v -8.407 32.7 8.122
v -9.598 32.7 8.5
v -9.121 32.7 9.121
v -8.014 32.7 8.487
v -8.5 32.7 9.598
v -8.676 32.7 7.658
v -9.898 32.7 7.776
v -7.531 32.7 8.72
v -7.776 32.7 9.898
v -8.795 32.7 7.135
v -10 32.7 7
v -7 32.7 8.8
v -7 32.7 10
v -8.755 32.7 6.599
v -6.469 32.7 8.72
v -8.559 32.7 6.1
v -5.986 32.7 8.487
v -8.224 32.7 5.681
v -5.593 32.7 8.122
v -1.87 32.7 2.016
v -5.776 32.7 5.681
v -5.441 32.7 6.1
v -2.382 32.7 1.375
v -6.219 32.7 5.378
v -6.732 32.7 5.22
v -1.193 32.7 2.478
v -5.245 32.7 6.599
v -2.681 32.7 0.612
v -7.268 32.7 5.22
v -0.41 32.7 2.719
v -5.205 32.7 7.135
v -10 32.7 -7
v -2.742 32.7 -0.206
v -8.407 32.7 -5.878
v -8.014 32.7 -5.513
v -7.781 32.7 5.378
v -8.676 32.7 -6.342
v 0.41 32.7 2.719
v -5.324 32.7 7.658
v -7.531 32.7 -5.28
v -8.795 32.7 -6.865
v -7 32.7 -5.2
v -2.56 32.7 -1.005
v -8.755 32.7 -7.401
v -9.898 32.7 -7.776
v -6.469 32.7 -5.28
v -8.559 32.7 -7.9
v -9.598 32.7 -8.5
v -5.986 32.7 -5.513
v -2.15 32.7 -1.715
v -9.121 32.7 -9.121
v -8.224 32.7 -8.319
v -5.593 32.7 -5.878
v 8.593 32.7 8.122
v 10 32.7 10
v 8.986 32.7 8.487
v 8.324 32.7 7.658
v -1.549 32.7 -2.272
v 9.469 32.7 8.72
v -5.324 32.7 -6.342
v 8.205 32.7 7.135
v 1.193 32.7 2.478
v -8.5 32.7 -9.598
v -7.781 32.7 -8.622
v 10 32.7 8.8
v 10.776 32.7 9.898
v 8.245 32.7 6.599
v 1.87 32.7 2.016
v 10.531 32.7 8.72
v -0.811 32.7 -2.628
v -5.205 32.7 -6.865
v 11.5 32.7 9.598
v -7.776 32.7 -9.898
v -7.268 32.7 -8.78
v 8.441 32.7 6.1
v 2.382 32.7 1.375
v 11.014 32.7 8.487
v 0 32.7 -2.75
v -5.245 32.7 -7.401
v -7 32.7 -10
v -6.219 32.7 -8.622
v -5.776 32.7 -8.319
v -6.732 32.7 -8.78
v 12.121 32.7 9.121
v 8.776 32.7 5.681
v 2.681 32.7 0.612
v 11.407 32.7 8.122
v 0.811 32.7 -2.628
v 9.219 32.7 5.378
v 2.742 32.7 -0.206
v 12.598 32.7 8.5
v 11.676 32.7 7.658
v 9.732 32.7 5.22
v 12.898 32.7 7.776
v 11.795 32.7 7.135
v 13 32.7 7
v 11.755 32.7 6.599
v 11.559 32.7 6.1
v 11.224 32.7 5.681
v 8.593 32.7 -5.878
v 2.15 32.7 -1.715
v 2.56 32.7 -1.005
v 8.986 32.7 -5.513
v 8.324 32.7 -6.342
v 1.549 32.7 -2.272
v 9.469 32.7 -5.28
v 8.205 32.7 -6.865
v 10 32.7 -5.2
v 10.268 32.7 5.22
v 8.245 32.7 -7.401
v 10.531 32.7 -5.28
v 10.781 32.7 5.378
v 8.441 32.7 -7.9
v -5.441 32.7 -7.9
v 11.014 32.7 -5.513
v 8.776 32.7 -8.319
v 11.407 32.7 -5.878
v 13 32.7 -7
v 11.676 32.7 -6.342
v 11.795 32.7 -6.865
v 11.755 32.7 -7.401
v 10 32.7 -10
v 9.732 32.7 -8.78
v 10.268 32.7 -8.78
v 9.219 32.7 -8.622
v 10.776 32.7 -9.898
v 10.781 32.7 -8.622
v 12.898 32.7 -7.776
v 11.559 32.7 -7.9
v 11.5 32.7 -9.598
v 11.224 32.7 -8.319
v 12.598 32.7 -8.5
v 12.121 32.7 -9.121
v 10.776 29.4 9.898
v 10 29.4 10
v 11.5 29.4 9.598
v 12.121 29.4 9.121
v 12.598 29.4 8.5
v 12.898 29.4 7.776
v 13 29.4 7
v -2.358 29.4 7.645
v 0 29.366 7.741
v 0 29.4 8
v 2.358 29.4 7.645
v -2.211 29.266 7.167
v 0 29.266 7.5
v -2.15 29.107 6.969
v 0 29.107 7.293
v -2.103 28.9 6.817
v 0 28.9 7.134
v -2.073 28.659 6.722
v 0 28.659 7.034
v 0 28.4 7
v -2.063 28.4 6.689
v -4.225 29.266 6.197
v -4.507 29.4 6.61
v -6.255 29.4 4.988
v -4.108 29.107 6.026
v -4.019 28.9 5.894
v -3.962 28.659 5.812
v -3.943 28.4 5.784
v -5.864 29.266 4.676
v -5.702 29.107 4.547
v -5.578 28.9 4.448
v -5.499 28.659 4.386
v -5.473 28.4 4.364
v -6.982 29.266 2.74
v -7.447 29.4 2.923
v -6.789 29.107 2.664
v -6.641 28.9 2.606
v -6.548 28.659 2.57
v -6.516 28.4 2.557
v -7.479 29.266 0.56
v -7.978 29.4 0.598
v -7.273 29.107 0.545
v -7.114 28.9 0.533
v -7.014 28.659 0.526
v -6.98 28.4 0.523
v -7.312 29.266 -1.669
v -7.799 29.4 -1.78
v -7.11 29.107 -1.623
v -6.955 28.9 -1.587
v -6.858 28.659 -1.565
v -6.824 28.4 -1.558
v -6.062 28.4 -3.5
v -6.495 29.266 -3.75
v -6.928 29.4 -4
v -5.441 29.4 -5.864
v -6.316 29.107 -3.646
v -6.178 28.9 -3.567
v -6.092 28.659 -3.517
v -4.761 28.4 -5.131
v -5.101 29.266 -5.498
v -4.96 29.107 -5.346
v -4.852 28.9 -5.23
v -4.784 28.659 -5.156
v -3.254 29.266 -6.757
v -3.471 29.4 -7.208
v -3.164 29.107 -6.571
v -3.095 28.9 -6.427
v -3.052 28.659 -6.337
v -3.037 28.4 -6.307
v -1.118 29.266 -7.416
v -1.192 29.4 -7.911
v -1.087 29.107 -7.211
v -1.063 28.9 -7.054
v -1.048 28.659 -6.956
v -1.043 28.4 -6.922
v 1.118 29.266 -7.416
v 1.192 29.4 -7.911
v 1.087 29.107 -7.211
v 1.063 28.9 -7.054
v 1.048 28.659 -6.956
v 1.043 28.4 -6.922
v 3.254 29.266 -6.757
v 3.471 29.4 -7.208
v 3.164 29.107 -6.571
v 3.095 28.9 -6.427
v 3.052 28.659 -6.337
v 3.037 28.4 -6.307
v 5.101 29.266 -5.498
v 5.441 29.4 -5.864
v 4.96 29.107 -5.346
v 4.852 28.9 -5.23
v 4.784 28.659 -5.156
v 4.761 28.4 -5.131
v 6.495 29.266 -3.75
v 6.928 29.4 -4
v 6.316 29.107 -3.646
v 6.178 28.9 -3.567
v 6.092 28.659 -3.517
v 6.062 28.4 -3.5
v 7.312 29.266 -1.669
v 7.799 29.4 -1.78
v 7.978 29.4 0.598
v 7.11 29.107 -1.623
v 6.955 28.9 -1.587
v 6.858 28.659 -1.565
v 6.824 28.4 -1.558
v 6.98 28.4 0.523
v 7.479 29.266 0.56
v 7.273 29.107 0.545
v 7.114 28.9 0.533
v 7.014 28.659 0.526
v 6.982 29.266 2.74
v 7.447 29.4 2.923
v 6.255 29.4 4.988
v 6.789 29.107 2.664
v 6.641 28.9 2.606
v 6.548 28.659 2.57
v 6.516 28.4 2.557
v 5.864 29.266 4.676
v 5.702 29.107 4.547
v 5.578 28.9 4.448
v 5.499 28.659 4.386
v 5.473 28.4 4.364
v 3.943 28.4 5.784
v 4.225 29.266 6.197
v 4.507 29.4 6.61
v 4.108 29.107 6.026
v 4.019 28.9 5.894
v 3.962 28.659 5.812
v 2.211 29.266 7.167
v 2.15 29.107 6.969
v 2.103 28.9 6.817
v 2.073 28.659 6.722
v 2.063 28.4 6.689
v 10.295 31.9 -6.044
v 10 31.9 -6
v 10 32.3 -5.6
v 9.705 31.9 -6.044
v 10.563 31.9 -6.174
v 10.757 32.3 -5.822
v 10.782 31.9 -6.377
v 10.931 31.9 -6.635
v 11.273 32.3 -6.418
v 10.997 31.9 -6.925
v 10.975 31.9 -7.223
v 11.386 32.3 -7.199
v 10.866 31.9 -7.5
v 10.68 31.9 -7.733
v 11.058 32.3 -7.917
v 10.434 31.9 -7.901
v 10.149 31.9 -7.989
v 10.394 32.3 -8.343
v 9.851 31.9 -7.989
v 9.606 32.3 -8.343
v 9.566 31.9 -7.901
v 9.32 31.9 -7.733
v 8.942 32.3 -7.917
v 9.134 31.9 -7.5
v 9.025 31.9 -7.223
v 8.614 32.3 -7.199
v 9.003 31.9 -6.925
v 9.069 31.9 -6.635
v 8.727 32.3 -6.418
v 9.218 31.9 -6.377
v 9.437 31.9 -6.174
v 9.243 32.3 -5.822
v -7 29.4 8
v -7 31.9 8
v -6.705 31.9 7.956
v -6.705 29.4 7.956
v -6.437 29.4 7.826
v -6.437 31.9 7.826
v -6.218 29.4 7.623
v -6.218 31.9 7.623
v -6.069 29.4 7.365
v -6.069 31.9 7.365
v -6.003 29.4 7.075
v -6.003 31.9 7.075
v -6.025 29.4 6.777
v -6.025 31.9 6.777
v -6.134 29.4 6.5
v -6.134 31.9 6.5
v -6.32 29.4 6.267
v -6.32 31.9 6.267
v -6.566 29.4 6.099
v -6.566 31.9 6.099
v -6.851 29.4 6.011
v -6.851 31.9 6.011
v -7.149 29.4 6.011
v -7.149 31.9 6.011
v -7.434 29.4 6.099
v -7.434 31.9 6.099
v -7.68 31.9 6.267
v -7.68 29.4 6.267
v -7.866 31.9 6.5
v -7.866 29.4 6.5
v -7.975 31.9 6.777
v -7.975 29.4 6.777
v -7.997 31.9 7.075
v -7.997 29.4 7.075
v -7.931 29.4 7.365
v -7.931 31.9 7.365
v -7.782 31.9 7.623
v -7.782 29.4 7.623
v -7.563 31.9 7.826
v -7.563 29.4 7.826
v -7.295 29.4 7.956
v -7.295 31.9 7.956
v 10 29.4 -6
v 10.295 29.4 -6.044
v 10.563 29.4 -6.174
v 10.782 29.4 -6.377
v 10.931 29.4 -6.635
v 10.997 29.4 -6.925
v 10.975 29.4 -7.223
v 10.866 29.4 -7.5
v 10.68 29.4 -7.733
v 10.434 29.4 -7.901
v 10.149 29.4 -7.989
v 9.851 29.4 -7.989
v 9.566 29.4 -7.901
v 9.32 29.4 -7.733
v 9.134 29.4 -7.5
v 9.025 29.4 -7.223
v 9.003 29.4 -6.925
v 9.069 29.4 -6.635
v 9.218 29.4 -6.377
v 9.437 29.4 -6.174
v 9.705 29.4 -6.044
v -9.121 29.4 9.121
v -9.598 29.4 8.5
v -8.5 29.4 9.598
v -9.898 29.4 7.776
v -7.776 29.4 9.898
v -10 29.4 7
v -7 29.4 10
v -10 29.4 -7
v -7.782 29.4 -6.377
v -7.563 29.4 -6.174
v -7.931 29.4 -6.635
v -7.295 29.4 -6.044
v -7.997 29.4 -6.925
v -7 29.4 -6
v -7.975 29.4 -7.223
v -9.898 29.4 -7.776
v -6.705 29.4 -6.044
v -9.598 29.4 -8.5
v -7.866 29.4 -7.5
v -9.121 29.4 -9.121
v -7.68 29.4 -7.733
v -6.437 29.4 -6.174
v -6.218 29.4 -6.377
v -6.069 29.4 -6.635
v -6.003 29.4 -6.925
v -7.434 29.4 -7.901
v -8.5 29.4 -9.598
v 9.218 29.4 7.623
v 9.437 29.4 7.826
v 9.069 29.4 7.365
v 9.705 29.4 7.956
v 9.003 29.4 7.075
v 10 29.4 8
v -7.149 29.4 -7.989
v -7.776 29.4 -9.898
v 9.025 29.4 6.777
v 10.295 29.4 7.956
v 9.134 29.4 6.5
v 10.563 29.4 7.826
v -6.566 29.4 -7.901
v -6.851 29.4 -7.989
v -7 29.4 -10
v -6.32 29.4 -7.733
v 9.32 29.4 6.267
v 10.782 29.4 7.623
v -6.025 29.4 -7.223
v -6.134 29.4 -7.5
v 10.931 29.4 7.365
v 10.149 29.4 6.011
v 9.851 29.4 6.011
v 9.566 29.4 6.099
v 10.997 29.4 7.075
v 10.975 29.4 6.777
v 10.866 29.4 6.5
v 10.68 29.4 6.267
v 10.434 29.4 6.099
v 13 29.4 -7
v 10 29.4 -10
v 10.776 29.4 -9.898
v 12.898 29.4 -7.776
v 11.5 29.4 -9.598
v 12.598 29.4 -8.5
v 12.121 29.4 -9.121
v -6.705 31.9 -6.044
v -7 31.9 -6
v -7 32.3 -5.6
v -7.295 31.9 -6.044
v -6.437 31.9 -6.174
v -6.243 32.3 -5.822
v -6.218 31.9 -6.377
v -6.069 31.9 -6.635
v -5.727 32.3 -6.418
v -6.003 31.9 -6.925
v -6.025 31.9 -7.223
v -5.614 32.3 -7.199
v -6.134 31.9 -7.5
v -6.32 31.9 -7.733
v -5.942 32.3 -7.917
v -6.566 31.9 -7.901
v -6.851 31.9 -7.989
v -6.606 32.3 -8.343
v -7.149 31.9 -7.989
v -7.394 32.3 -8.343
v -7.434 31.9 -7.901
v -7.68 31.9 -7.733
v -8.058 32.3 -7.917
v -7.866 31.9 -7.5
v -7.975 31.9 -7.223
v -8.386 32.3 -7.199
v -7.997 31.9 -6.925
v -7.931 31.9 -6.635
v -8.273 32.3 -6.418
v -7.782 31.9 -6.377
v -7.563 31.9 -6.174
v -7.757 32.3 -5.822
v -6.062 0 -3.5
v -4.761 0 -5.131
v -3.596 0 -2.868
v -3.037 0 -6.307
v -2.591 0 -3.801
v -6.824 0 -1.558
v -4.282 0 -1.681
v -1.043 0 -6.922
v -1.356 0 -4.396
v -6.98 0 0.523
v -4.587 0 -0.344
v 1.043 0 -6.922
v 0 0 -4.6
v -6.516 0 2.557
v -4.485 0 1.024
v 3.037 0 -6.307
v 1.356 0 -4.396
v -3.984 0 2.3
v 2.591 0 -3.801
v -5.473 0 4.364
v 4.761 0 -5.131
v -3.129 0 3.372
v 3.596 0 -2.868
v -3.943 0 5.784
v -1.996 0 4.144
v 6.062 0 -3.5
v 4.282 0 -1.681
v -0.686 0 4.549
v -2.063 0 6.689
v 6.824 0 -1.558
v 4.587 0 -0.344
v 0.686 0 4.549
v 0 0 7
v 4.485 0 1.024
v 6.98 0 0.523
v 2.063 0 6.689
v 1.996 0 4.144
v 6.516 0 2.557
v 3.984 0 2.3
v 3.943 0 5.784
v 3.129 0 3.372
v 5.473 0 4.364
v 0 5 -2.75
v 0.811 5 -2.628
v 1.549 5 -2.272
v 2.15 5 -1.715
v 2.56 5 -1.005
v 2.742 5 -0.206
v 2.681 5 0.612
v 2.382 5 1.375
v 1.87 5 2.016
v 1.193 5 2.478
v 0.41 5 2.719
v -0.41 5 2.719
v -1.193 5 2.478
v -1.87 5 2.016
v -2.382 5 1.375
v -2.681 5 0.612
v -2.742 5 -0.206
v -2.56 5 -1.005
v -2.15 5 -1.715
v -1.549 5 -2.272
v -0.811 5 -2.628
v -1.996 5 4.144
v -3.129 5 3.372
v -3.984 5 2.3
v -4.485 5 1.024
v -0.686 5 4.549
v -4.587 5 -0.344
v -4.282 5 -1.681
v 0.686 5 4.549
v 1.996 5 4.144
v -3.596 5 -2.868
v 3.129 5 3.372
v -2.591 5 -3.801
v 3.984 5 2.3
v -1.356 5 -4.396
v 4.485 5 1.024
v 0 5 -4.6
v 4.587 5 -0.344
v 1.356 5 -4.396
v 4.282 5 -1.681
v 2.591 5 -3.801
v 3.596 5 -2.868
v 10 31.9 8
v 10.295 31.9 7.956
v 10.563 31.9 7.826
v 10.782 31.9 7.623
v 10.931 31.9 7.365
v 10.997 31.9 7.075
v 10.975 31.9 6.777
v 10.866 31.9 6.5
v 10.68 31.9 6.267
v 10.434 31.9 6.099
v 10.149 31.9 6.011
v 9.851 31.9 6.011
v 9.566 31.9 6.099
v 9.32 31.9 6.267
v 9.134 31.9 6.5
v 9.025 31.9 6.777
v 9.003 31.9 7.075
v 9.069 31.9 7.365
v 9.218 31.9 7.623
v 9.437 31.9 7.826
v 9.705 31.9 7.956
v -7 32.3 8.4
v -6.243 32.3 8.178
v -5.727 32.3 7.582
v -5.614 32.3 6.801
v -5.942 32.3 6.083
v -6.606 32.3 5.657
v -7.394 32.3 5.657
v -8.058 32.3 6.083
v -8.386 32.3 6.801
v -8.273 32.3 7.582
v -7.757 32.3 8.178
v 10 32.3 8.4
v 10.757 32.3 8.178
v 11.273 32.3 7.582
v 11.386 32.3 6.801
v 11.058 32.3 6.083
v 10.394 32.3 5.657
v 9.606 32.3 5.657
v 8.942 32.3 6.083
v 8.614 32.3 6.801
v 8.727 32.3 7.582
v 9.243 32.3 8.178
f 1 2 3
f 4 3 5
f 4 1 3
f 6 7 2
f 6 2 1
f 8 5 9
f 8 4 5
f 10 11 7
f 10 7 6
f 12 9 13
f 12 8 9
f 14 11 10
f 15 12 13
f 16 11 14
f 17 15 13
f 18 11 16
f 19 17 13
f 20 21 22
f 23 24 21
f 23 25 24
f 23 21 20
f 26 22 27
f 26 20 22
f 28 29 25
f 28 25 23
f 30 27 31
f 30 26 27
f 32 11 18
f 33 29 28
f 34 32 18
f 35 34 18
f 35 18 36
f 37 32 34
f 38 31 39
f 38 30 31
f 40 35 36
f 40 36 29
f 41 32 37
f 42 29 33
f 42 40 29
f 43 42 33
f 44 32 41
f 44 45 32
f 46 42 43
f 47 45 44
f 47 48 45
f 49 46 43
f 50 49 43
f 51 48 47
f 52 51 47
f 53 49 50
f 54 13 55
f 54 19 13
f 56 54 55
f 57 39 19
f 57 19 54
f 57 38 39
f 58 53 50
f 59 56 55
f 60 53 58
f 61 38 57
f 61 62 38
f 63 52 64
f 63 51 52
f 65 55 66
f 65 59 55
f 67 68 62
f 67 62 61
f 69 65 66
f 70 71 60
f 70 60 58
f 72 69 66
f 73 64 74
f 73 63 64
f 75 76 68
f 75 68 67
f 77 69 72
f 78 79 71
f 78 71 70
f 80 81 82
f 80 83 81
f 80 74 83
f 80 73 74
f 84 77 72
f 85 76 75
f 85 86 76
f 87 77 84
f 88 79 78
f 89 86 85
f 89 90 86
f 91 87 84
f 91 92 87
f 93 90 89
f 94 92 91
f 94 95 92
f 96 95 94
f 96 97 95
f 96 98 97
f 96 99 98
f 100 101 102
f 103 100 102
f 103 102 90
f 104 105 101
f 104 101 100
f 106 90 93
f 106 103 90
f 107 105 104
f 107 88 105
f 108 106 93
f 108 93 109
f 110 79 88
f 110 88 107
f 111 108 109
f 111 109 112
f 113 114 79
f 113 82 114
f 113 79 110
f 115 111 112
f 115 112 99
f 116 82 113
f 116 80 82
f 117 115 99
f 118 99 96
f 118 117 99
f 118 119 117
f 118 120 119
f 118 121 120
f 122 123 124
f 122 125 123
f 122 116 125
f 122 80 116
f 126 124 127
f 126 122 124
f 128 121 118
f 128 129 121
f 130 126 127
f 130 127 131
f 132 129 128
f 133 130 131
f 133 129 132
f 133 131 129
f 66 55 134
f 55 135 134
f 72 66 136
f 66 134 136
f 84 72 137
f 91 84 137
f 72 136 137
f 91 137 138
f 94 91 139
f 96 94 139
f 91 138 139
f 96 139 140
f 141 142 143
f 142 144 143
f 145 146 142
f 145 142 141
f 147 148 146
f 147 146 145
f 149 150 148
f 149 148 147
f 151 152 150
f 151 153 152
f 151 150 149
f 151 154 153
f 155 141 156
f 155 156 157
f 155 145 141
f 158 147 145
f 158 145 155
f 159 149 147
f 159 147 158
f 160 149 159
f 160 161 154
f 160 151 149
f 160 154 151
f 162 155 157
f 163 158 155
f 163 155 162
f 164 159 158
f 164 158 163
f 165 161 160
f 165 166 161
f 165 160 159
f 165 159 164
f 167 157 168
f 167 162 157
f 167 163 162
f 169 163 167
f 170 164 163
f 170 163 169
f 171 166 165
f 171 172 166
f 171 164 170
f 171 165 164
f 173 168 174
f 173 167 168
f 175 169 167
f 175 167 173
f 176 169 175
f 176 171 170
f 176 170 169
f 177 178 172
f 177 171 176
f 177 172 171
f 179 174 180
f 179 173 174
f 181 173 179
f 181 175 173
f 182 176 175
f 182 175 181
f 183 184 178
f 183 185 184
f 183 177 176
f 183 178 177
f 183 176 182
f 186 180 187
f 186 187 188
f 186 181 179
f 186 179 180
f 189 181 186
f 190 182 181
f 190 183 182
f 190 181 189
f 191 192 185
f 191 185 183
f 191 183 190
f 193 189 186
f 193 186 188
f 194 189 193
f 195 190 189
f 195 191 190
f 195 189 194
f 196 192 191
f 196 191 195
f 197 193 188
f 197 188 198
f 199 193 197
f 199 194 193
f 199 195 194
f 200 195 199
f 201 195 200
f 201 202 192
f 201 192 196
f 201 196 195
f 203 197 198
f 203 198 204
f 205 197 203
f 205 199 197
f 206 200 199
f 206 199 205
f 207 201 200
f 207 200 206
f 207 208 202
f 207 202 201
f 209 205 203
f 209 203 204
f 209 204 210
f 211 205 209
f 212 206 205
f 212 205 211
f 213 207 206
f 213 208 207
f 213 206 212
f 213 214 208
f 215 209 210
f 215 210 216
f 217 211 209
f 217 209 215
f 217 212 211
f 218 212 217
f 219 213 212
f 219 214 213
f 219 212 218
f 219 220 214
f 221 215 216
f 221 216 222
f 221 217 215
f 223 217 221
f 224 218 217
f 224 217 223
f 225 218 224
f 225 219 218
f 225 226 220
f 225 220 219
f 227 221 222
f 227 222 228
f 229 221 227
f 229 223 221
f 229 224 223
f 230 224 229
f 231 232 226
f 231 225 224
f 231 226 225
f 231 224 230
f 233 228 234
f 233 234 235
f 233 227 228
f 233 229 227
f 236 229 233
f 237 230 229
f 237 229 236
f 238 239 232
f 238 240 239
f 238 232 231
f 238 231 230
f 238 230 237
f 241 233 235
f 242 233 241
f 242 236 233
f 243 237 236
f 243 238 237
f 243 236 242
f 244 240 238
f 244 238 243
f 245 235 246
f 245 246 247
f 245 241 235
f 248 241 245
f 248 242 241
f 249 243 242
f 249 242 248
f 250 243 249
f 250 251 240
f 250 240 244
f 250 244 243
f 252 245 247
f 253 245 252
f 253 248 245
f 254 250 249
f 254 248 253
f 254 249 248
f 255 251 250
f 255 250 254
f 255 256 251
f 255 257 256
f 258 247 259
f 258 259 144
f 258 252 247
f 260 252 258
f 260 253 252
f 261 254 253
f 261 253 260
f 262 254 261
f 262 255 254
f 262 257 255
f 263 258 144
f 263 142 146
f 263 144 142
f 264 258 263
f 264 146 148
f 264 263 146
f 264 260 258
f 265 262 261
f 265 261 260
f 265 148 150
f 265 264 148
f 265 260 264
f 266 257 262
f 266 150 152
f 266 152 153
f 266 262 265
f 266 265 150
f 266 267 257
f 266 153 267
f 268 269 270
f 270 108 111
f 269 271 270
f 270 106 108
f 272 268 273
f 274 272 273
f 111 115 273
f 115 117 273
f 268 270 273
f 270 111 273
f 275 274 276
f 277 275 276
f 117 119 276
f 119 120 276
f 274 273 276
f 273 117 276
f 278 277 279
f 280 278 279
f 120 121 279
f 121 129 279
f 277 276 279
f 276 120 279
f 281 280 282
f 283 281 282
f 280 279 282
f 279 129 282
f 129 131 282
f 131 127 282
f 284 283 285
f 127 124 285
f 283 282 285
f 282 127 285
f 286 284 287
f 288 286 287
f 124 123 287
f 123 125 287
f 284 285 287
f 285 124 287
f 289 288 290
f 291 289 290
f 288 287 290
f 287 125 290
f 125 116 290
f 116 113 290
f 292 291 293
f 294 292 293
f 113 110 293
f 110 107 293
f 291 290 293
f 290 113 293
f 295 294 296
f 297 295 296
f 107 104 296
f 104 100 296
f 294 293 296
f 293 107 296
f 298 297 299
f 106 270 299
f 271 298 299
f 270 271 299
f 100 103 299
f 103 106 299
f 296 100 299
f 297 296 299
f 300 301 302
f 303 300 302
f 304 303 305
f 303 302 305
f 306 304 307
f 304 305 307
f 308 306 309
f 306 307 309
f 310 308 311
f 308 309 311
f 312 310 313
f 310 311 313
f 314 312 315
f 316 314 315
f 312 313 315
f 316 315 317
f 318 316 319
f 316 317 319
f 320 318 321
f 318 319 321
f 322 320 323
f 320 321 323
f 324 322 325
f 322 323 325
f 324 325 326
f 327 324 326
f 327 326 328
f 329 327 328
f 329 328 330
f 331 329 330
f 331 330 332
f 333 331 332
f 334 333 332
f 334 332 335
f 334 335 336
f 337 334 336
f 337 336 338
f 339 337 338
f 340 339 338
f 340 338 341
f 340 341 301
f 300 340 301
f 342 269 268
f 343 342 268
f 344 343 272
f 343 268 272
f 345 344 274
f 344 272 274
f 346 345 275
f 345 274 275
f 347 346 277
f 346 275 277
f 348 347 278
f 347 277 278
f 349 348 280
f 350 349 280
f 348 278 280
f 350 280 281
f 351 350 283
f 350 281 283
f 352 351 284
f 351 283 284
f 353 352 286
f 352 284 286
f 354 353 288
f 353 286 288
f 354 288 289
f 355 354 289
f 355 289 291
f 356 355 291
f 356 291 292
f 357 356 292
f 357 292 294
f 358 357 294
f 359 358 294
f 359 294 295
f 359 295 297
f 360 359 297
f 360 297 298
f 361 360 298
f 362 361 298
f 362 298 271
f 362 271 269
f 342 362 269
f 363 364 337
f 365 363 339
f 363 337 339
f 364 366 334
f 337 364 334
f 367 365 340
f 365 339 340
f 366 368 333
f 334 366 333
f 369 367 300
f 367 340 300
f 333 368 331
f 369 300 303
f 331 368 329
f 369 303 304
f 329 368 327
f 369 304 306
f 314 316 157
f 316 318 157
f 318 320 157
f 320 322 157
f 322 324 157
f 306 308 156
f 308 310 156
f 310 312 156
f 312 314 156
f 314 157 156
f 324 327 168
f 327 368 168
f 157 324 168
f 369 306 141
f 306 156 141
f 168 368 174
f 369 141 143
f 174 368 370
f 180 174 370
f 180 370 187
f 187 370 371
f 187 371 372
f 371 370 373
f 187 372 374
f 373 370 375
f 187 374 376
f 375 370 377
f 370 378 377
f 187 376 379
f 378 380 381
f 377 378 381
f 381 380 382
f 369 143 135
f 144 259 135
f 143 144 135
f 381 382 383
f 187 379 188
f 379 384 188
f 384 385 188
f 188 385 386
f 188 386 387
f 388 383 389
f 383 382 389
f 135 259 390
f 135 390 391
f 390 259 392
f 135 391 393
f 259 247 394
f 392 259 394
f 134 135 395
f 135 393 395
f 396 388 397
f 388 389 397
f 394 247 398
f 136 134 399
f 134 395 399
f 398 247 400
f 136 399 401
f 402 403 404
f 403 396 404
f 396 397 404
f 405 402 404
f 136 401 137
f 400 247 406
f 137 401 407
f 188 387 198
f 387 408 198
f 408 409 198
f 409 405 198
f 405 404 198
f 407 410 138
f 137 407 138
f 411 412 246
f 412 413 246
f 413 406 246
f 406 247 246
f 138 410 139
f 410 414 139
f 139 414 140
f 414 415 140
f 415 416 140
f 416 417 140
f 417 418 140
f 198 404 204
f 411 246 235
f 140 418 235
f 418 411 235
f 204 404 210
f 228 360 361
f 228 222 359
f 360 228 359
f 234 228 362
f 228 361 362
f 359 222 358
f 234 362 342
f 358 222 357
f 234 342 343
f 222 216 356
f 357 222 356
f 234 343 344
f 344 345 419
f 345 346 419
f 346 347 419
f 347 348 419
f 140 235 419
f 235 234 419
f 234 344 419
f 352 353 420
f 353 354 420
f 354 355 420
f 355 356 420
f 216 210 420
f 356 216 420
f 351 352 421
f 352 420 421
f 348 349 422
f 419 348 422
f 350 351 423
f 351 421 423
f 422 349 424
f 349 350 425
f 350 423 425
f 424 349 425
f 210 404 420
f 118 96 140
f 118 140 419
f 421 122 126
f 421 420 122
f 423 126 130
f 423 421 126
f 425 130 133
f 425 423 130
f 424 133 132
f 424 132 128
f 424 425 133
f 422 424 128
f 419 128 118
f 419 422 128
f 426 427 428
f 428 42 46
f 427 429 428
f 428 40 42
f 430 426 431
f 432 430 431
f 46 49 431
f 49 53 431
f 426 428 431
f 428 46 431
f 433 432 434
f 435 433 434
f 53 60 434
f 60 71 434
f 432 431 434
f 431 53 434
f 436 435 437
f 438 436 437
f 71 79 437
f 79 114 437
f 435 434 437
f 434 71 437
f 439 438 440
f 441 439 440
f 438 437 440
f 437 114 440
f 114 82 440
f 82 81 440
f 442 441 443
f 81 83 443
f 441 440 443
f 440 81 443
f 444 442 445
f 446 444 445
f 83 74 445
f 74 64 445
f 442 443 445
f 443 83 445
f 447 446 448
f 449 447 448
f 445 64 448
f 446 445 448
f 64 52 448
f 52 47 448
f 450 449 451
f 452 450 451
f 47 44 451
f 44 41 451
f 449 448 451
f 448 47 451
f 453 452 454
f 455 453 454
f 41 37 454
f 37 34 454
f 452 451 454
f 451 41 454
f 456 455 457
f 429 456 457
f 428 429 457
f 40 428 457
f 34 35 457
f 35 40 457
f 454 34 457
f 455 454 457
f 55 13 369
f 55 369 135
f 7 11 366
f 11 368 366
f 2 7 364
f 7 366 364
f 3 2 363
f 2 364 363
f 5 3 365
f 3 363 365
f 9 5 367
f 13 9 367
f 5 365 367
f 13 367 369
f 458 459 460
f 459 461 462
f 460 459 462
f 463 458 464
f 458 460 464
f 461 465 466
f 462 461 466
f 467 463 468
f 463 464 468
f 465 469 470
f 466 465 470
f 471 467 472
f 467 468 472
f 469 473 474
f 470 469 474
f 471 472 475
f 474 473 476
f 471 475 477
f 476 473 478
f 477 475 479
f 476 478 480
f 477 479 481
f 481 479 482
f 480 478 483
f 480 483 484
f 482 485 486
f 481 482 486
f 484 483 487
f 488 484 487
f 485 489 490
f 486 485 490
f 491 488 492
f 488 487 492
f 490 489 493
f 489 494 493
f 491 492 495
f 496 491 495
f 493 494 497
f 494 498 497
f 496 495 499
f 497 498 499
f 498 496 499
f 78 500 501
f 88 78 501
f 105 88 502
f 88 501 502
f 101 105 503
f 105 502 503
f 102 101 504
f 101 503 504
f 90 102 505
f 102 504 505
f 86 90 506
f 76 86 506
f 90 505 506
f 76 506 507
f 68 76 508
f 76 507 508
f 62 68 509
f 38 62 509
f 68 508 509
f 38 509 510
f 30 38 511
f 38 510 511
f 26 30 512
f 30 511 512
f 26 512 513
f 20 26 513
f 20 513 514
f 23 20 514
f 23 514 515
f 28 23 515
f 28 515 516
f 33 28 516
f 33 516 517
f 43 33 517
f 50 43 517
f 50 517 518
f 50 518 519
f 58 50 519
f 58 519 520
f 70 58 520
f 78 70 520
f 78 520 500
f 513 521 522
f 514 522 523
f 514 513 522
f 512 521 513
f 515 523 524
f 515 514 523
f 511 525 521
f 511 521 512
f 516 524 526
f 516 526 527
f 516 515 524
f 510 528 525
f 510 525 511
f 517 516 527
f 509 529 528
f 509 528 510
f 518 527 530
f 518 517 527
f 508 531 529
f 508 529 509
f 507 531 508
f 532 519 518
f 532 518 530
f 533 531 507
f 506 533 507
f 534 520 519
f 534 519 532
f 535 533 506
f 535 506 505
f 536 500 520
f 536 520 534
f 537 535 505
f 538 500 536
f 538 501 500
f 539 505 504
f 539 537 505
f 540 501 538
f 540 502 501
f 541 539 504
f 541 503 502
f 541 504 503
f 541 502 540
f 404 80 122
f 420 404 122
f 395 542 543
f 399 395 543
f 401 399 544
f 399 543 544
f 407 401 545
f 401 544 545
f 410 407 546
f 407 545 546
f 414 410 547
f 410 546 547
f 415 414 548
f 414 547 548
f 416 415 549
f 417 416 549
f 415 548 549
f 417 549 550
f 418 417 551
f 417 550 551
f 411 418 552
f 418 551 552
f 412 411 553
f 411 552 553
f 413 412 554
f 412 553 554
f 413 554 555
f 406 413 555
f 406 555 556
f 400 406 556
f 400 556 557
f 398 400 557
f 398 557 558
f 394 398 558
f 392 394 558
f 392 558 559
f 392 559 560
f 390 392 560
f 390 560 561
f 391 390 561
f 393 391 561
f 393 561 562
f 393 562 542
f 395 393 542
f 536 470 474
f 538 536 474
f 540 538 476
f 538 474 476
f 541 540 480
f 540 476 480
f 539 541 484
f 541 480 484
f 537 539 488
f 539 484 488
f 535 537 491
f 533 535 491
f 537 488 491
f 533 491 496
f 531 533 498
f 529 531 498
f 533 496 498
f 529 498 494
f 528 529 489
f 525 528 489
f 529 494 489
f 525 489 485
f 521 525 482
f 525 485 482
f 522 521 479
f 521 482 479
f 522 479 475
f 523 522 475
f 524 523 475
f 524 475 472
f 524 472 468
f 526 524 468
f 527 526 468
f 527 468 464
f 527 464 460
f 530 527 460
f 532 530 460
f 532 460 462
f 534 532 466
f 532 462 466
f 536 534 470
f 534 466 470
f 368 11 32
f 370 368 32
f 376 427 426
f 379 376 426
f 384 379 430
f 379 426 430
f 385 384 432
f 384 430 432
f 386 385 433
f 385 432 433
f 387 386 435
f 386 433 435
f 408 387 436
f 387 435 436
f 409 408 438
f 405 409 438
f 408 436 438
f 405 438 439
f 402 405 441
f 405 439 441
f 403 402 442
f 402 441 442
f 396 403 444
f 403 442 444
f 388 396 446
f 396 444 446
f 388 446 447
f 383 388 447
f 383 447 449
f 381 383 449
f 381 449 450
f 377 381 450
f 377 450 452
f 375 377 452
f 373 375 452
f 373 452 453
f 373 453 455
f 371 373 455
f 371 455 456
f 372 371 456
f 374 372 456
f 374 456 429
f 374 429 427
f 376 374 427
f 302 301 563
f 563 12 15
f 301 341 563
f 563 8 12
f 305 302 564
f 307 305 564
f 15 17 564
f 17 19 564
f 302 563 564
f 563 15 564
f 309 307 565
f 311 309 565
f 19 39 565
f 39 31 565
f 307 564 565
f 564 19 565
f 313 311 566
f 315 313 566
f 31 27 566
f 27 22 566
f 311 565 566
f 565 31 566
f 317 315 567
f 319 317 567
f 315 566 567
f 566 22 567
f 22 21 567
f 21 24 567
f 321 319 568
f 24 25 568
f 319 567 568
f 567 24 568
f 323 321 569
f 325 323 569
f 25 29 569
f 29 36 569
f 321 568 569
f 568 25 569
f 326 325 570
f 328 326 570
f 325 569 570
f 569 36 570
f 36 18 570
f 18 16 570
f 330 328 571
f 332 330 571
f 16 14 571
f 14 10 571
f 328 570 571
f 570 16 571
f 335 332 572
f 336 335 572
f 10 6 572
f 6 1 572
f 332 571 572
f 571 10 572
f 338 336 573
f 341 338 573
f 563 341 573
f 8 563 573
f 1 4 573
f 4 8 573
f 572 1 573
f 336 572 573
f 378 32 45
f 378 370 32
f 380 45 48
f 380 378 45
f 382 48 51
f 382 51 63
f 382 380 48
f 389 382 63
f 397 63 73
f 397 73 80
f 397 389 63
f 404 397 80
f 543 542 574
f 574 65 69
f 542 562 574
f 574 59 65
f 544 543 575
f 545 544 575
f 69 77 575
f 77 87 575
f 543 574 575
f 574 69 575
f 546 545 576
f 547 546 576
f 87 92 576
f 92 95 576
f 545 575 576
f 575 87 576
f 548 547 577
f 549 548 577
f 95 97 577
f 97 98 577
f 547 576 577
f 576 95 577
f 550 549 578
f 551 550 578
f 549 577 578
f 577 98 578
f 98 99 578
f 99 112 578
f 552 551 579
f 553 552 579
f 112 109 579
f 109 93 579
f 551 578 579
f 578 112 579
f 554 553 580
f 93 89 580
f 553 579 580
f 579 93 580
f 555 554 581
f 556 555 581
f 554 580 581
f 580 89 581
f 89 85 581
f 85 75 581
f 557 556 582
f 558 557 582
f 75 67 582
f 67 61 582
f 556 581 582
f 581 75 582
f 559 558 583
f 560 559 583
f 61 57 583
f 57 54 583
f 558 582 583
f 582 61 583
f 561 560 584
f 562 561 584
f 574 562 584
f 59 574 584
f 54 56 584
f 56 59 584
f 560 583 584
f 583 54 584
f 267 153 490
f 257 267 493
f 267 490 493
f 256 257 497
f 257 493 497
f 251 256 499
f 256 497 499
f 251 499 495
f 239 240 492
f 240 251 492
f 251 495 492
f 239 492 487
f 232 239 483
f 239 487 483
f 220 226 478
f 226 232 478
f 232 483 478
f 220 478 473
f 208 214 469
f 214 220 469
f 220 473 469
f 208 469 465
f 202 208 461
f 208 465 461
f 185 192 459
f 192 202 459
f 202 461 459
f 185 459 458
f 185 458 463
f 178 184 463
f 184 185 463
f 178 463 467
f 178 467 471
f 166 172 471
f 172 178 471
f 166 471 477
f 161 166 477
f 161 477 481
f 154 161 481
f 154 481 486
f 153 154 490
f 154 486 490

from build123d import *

# Parameters (mm, degrees)
SKETCH1_R           = 7
BOSS_EXTRUDE1_DEPTH = 32.7
SKETCH4_W           = 23
SKETCH4_H           = 20
SKETCH4_R           = 3.5
BOSS_EXTRUDE2_DEPTH = 3.3
FILLET1_R           = 3
SKETCH5_R           = 1
CUT_EXTRUDE3_DEPTH  = 5
SKETCH2_R           = 4.6
CUT_EXTRUDE4_DEPTH  = 5
SKETCH6_R           = 2.75
CUT_EXTRUDE5_DEPTH  = 36
FILLET2_R           = 1
CHAMFER1_SIZE       = 0.8


with BuildPart() as part:
    # Sketch1 → Boss-Extrude1 (new body)
    with BuildSketch(Plane(origin=(0, 0, 0), x_dir=(1, 0, 0), z_dir=(0, 1, 0))):
        with Locations(Location((0, 0, 0), (0, 0, 270))):
            Circle(SKETCH1_R)
    extrude(amount=BOSS_EXTRUDE1_DEPTH)

    # Sketch4 → Boss-Extrude2 (add)
    with BuildSketch(Plane(origin=(0, 32.7, 0), x_dir=(1, 0, 0), z_dir=(0, 1, 0))):
        with Locations((1.5, 0)):
            Rectangle(SKETCH4_W, SKETCH4_H)
        Circle(SKETCH4_R, mode=Mode.SUBTRACT)
    extrude(amount=-BOSS_EXTRUDE2_DEPTH)

    # Fillet1
    fillet1_edges = [part.edges().sort_by_distance(p)[0] for p in [
        (-10, 31.05, 10),
        (-10, 31.05, -10),
        (13, 31.05, -10),
        (13, 31.05, 10),
    ]]
    fillet(fillet1_edges, radius=FILLET1_R)

    # Sketch5 → Cut-Extrude3 (cut)
    with BuildSketch(Plane(origin=(0, 32.7, 0), x_dir=(1, 0, 0), z_dir=(0, 1, 0))):
        with Locations(Location((-7, 7, 0), (0, 0, 270))):
            Circle(SKETCH5_R)
        with Locations(Location((10, 7, 0), (0, 0, 270))):
            Circle(SKETCH5_R)
        with Locations(Location((10, -7, 0), (0, 0, 270))):
            Circle(SKETCH5_R)
        with Locations(Location((-7, -7, 0), (0, 0, 270))):
            Circle(SKETCH5_R)
    extrude(amount=-CUT_EXTRUDE3_DEPTH, mode=Mode.SUBTRACT)

    # Sketch2 → Cut-Extrude4 (cut)
    with BuildSketch(Plane.XZ):
        with Locations(Location((0, 0, 0), (0, 0, 270))):
            Circle(SKETCH2_R)
    extrude(amount=-CUT_EXTRUDE4_DEPTH, mode=Mode.SUBTRACT)

    # Sketch6 → Cut-Extrude5 (cut)
    with BuildSketch(Plane.XZ.offset(-5)):
        with Locations(Location((0, 0, 0), (0, 0, 270))):
            Circle(SKETCH6_R)
    extrude(amount=-CUT_EXTRUDE5_DEPTH, mode=Mode.SUBTRACT)

    # Fillet2
    fillet2_edges = [part.edges().sort_by_distance(p)[0] for p in [
        (0, 29.4, -7),
    ]]
    fillet(fillet2_edges, radius=FILLET2_R)

    # Chamfer1
    chamfer1_edges = [part.edges().sort_by_distance(p)[0] for p in [
        (-7, 32.7, 6),
        (10, 32.7, 6),
        (10, 32.7, -8),
        (-7, 32.7, -8),
    ]]
    chamfer(chamfer1_edges, length=CHAMFER1_SIZE)


solid = part.part
